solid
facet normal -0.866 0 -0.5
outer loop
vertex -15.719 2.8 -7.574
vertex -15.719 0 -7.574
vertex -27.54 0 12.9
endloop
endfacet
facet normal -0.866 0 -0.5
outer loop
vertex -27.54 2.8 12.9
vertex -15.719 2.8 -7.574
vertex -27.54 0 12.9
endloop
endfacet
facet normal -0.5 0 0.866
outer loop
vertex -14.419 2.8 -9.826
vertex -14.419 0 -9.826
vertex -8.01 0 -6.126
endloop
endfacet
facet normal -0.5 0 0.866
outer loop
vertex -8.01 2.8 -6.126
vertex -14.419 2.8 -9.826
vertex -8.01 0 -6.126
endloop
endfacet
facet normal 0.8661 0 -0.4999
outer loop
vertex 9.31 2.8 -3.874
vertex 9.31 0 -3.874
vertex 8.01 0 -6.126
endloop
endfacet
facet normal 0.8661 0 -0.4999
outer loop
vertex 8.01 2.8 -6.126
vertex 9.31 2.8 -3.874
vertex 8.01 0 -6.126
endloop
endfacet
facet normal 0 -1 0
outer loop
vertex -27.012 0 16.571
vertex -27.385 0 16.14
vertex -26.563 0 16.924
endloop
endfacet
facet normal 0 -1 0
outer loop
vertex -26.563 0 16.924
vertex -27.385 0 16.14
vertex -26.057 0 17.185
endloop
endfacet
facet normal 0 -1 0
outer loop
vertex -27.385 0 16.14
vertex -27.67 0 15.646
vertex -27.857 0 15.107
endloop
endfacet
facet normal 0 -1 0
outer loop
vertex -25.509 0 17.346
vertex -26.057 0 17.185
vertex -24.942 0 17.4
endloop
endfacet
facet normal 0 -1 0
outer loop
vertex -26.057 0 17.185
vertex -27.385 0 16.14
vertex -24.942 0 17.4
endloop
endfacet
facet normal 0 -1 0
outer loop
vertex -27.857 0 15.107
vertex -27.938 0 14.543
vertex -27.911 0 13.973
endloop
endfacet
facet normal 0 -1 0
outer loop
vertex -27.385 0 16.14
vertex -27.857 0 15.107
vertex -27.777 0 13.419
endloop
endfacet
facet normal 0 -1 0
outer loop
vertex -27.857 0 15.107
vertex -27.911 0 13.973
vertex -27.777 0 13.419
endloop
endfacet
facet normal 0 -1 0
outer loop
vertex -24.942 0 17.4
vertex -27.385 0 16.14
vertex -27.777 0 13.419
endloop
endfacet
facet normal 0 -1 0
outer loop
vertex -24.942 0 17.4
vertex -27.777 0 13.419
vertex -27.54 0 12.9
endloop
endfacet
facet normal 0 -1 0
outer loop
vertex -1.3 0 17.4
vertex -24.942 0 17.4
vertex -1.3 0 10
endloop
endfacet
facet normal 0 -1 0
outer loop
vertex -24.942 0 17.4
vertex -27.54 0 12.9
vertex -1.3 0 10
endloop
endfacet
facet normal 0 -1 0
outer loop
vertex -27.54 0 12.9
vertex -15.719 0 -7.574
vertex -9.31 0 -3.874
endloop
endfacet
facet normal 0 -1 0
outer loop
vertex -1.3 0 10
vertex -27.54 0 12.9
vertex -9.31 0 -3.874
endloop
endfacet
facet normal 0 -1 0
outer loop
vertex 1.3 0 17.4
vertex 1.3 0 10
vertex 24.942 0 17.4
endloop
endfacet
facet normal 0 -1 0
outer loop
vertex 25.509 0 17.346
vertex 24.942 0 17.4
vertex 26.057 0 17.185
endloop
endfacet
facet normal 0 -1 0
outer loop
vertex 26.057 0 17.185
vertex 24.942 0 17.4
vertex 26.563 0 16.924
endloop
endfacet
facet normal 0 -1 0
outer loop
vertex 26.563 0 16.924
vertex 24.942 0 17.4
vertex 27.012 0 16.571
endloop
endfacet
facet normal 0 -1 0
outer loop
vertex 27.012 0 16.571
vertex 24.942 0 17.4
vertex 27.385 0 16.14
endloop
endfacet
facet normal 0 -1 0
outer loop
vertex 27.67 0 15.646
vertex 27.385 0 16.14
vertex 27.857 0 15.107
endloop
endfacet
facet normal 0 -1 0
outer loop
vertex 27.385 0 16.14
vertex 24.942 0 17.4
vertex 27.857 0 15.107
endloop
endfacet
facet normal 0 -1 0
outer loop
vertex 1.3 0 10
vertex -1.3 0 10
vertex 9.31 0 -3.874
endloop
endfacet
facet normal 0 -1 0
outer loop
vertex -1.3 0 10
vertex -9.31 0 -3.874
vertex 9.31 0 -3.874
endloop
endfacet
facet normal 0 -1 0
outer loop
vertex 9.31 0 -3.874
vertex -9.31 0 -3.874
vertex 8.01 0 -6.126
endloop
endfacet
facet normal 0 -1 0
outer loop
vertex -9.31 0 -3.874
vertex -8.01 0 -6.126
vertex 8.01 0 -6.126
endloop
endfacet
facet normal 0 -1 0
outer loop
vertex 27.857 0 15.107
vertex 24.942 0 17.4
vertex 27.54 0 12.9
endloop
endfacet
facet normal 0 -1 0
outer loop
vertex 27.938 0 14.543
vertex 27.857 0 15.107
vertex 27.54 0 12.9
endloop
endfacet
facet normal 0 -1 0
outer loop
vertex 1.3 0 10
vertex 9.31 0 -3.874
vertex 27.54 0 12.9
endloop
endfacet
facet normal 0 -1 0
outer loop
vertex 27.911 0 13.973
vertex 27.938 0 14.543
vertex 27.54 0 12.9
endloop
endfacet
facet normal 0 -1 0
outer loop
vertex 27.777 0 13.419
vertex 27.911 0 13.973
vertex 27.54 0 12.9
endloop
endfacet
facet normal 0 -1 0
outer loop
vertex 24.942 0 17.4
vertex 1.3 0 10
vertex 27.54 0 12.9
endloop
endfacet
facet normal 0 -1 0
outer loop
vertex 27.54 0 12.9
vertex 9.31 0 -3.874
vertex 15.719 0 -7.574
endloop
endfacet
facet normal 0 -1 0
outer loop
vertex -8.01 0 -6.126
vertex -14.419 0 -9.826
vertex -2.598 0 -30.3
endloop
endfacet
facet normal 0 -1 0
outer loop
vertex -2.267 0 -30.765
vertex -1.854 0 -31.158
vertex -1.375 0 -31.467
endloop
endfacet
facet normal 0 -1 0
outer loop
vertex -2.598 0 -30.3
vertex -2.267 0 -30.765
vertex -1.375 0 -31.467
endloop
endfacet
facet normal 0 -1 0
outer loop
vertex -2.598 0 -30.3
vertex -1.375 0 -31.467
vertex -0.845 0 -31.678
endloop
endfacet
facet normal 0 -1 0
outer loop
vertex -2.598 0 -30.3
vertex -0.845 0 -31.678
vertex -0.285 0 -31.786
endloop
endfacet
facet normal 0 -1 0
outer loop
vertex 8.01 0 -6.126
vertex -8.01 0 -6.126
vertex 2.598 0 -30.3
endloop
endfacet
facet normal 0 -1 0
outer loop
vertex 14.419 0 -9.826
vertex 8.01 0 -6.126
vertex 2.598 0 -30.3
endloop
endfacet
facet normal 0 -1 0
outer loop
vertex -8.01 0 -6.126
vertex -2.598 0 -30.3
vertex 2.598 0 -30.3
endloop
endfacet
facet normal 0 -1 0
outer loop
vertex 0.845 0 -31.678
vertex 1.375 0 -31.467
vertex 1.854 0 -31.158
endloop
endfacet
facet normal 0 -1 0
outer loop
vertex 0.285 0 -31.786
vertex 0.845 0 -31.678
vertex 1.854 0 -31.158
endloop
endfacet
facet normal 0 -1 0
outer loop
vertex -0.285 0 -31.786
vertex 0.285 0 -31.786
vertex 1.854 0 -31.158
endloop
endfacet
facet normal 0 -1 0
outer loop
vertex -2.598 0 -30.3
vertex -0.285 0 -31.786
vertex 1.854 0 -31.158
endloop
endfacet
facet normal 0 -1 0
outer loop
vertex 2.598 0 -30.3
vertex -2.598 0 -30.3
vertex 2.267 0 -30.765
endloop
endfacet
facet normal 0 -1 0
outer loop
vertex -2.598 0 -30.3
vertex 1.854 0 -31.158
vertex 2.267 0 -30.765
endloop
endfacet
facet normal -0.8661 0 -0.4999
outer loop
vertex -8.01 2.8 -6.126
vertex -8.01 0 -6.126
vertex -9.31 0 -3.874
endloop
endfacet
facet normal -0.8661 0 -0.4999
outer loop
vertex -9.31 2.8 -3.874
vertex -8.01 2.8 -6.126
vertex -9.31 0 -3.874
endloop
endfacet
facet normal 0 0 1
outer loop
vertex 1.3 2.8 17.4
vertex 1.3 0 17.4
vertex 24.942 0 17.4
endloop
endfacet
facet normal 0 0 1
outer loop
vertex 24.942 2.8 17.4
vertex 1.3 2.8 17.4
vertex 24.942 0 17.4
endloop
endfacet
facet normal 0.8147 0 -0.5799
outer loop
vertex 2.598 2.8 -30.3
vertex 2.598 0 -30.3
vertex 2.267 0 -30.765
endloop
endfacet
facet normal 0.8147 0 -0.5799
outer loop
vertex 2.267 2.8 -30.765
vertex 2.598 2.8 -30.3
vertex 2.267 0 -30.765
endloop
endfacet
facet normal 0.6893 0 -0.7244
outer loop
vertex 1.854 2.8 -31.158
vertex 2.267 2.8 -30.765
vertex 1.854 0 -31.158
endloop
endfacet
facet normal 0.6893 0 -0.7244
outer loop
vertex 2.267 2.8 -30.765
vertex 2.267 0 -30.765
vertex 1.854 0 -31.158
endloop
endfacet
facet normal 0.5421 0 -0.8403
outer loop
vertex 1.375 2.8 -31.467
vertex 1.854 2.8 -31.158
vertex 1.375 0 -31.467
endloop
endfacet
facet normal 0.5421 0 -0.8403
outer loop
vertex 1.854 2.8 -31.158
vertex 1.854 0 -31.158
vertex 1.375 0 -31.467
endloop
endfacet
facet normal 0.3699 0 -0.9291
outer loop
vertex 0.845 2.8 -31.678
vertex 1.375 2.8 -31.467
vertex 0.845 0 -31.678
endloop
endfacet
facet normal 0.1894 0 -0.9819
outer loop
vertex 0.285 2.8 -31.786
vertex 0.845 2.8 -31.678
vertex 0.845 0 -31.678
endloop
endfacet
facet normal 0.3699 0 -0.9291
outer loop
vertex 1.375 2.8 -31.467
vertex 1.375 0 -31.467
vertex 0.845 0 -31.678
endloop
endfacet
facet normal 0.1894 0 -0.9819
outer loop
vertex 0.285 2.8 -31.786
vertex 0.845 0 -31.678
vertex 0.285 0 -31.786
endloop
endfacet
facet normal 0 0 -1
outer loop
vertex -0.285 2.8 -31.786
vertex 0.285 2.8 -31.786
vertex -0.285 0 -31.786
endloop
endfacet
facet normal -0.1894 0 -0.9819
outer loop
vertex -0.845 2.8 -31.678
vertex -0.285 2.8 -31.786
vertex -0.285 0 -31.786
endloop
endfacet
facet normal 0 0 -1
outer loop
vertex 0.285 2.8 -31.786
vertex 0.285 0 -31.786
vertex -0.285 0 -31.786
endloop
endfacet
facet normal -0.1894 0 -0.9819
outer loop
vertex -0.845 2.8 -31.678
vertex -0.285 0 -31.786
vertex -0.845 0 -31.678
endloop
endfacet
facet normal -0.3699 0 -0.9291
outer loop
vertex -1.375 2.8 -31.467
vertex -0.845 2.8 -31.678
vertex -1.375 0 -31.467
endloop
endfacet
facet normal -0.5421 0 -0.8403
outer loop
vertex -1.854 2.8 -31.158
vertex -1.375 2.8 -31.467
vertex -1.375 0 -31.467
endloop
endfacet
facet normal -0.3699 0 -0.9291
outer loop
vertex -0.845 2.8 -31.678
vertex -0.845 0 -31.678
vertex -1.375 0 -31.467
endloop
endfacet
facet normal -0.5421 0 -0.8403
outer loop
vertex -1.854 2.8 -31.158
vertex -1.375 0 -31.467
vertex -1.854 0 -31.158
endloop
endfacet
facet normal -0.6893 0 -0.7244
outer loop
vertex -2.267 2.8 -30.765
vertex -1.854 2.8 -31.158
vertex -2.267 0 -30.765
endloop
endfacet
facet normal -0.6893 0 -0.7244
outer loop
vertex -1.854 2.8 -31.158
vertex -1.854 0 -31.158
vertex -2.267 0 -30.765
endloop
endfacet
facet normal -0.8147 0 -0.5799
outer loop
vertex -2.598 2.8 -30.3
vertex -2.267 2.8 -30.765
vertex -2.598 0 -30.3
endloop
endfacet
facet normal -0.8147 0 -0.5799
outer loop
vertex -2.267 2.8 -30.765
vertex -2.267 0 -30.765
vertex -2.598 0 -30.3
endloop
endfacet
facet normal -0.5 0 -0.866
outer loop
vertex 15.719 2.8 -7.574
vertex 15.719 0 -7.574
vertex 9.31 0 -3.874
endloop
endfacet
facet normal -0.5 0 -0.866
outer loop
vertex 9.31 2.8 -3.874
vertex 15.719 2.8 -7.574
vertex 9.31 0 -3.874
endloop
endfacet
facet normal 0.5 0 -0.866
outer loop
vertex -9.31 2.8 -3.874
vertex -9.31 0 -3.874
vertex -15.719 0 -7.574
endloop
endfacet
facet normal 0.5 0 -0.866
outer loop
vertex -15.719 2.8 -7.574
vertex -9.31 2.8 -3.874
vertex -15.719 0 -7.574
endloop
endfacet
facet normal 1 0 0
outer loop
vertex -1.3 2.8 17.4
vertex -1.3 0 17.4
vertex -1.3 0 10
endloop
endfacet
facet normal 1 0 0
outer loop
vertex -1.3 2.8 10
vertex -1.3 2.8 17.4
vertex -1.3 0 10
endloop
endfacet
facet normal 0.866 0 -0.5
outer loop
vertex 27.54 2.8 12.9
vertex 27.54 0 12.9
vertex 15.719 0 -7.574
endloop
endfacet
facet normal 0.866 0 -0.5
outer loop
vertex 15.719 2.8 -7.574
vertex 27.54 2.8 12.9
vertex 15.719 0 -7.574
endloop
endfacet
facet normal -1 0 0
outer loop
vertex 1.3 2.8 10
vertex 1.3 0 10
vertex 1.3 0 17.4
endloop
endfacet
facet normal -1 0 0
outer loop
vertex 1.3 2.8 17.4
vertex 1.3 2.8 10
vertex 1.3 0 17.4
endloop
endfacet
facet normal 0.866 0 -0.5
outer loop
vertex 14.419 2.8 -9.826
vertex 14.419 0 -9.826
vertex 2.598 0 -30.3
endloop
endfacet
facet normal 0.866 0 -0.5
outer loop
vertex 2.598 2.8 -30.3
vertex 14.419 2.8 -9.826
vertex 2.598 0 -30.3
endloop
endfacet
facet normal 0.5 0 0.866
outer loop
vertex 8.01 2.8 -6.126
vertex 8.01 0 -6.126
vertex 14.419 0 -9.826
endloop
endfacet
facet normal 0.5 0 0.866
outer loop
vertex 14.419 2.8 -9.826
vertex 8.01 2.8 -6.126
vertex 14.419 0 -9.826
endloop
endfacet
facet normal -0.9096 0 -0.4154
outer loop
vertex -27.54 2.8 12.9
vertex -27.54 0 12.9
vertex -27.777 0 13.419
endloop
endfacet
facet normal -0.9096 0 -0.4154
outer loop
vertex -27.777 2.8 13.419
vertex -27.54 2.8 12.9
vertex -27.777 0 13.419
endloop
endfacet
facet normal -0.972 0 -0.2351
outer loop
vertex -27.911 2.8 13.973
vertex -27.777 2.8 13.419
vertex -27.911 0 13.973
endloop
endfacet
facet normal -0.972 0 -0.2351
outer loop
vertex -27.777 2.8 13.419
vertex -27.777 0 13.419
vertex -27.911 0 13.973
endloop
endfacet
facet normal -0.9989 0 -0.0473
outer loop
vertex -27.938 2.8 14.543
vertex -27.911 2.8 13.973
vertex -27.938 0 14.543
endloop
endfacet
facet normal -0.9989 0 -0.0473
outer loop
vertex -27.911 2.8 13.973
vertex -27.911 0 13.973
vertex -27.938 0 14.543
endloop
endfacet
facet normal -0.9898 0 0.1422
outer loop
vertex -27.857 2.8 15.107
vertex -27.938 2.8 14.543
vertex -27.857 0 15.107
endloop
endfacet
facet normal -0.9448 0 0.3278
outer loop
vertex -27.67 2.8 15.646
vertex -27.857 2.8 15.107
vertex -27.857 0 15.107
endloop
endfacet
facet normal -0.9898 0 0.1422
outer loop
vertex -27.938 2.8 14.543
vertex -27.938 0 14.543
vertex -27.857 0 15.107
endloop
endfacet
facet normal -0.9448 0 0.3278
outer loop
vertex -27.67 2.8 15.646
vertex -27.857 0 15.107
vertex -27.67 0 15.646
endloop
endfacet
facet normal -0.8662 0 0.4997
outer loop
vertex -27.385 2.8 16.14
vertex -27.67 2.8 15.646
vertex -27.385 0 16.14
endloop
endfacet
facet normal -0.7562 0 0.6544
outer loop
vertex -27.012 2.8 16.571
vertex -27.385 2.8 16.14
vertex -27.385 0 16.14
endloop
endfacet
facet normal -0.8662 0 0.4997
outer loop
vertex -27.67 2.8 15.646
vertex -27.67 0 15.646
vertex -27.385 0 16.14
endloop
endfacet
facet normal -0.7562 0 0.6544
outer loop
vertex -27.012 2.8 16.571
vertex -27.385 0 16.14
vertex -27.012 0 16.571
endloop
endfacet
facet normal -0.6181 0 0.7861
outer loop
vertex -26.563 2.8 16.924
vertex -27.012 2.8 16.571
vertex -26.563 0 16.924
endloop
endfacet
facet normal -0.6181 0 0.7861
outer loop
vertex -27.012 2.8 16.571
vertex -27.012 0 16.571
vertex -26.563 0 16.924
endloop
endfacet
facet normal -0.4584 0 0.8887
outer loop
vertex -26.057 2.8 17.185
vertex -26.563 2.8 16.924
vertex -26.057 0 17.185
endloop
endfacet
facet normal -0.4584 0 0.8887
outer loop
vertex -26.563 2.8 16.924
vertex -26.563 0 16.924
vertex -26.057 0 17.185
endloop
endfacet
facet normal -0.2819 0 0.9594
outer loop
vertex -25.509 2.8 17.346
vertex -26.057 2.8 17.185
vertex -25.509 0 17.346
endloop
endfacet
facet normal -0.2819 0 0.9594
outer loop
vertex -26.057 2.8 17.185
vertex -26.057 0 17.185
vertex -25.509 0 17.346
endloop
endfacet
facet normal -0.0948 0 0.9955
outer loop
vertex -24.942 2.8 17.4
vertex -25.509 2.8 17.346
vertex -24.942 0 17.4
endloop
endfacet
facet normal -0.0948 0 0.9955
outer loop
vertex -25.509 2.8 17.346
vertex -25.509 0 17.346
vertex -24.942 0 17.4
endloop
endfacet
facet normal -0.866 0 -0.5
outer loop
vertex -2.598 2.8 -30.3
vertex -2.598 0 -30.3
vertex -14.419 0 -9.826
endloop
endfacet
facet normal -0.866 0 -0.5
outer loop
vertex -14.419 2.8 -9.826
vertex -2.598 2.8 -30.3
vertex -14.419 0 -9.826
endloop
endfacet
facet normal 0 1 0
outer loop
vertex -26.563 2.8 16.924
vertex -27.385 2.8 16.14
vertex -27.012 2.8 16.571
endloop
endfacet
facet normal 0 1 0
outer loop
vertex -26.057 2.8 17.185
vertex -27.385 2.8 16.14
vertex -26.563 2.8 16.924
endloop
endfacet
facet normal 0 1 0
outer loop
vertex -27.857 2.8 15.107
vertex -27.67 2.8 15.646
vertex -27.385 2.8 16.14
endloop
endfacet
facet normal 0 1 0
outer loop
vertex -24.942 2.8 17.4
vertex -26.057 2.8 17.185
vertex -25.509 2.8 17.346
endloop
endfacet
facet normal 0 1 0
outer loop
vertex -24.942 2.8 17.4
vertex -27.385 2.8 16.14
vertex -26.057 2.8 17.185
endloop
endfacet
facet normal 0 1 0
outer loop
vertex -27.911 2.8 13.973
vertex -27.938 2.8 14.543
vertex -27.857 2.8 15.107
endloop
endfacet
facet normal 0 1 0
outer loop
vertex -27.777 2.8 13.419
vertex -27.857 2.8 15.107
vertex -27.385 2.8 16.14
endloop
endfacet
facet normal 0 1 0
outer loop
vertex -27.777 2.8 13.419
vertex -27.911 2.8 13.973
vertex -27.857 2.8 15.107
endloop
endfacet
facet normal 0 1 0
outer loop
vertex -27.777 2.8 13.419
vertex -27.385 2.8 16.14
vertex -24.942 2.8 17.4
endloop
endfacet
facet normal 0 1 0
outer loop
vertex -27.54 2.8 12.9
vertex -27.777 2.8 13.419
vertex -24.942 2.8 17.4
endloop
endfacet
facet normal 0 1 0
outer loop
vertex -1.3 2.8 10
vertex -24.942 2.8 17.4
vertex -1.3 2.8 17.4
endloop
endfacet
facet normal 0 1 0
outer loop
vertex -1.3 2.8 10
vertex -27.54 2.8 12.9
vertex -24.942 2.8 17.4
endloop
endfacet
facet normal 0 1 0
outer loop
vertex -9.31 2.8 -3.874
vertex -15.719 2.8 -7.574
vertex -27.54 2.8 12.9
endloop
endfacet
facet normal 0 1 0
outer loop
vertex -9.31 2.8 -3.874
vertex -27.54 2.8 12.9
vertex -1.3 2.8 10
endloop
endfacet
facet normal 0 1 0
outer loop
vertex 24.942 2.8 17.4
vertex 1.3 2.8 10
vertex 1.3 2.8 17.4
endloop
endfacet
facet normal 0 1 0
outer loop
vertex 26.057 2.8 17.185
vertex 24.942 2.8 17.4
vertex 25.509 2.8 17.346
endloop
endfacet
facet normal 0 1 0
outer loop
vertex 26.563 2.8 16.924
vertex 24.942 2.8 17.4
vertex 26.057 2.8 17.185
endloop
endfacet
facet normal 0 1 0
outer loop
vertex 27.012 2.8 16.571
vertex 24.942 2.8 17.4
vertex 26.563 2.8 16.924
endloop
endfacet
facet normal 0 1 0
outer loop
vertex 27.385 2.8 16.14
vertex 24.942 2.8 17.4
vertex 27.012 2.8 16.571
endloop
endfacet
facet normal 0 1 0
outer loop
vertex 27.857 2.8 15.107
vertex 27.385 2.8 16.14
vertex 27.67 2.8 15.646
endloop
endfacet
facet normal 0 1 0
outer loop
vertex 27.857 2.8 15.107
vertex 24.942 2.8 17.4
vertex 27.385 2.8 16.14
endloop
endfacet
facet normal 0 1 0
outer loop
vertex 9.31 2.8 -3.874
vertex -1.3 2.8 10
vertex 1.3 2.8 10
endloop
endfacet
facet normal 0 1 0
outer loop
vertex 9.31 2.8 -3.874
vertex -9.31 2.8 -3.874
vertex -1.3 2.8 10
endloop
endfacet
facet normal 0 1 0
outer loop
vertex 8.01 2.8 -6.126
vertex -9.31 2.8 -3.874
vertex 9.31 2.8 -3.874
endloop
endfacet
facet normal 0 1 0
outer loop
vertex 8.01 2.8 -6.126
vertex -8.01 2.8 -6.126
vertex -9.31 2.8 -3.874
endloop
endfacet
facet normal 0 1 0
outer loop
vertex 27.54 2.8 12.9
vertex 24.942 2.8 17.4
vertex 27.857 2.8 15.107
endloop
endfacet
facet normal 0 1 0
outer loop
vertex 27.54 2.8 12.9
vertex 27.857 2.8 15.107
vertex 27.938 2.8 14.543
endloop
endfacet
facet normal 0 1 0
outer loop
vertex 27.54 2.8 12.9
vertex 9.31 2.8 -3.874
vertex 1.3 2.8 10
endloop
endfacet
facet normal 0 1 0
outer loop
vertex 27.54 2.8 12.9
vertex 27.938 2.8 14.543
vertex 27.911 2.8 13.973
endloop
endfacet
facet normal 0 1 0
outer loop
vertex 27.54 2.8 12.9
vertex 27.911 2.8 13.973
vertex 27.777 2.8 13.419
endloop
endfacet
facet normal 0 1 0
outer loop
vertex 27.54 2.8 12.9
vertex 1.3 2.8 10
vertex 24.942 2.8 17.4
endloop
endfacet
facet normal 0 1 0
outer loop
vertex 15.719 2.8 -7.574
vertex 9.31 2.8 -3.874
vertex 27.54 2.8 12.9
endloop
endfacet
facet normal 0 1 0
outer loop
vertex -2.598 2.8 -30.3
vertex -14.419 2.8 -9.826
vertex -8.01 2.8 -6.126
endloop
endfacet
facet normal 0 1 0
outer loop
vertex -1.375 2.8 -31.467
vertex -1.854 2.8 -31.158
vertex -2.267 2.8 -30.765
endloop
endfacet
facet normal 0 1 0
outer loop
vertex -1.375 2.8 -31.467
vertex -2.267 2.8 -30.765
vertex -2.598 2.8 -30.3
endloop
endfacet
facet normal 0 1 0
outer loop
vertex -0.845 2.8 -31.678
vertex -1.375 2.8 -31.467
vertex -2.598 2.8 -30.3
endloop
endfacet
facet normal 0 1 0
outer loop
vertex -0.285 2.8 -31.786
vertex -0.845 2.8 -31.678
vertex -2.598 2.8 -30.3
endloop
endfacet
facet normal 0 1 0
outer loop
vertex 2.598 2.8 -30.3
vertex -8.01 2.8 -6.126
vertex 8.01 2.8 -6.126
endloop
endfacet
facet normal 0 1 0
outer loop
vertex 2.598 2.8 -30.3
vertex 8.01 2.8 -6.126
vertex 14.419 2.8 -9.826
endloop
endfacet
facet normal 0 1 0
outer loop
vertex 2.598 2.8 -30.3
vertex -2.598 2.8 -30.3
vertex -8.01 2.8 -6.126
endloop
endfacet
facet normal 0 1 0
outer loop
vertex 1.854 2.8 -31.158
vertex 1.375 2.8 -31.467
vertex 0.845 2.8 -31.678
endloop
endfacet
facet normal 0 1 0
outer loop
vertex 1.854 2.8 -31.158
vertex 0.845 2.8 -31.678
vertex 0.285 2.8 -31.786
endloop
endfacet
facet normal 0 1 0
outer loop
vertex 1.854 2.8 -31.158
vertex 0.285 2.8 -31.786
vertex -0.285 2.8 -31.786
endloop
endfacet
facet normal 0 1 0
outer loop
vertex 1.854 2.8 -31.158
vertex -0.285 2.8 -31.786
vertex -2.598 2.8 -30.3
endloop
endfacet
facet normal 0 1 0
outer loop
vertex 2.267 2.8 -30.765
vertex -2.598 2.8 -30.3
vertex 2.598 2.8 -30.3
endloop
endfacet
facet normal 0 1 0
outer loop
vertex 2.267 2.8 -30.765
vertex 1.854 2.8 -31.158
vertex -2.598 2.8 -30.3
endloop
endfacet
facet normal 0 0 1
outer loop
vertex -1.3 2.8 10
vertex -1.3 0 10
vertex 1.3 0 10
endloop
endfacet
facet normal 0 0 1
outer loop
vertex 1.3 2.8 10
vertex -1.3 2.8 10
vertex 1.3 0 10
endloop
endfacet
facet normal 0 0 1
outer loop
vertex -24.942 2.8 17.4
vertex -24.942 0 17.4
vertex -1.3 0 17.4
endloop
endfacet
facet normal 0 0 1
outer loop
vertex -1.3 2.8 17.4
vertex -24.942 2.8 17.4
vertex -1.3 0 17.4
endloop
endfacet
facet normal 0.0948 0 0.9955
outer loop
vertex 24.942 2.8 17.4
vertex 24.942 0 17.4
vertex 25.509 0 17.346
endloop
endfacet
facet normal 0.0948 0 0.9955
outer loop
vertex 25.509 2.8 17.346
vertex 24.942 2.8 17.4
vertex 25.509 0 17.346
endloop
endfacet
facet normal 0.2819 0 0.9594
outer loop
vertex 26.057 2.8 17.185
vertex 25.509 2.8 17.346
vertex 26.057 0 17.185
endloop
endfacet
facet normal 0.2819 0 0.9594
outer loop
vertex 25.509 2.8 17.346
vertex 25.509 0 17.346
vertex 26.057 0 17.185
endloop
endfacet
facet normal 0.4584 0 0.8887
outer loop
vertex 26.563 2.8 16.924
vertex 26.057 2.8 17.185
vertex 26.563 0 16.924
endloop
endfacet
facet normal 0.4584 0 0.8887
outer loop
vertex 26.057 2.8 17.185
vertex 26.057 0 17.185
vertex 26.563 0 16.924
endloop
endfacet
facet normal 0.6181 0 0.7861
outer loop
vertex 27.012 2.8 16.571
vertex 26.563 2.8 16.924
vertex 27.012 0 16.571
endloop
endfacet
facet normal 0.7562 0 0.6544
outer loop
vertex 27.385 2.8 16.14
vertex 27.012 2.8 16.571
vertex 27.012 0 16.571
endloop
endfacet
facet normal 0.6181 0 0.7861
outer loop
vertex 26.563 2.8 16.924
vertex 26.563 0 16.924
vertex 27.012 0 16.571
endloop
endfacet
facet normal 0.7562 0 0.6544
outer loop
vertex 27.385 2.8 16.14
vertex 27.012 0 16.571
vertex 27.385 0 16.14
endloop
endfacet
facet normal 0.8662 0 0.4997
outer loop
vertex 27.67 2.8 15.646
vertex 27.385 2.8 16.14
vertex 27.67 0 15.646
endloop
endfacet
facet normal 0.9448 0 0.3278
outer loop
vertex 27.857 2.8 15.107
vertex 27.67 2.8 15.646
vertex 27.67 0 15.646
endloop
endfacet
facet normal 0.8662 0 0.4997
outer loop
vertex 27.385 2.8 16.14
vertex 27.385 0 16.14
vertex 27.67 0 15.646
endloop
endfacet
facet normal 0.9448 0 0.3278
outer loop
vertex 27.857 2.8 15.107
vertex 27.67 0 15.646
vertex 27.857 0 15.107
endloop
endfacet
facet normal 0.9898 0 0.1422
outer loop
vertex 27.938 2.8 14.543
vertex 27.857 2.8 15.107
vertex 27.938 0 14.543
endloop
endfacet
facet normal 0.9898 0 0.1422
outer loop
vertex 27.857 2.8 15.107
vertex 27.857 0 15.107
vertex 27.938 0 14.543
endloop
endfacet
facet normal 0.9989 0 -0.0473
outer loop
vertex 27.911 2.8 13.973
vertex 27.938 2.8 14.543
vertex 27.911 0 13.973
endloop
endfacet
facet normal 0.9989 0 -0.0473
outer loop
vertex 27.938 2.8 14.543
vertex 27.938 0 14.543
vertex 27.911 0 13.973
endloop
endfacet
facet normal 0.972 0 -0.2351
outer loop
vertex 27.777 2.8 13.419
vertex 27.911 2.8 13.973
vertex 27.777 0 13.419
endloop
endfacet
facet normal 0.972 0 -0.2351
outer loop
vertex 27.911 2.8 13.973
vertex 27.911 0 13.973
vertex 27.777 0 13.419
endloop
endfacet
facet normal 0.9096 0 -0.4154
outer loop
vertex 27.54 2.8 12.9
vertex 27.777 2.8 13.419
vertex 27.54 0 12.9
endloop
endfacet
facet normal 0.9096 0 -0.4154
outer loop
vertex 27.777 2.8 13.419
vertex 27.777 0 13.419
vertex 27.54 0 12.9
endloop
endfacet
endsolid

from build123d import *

# Parameters (mm, degrees)
BOSS_EXTRUDE1_DEPTH = 2.8


with BuildPart() as part:
    # Sketch1 → Boss-Extrude1 (new body)
    with BuildSketch(Plane(origin=(0, 0, 0), x_dir=(1, 0, 0), z_dir=(0, 1, 0))):
        with BuildLine():
            Line((1.3, -17.4), (24.941531629, -17.4))
            ThreePointArc((24.941531629, -17.4), (27.53960784, -15.9), (27.53960784, -12.9))
            Line((27.53960784, -12.9), (15.718842026, 7.574166975))
            Line((15.718842026, 7.574166975), (9.310254038, 3.874166975))
            Line((9.310254038, 3.874166975), (8.010254038, 6.125833025))
            Line((8.010254038, 6.125833025), (14.418842026, 9.825833025))
            Line((14.418842026, 9.825833025), (2.598076211, 30.3))
            ThreePointArc((2.598076211, 30.3), (0, 31.8), (-2.598076211, 30.3))
            Line((-2.598076211, 30.3), (-14.418842026, 9.825833025))
            Line((-14.418842026, 9.825833025), (-8.010254038, 6.125833025))
            Line((-8.010254038, 6.125833025), (-9.310254038, 3.874166975))
            Line((-9.310254038, 3.874166975), (-15.718842026, 7.574166975))
            Line((-15.718842026, 7.574166975), (-27.53960784, -12.9))
            ThreePointArc((-27.53960784, -12.9), (-27.53960784, -15.9), (-24.941531629, -17.4))
            Line((-24.941531629, -17.4), (-1.3, -17.4))
            Line((-1.3, -17.4), (-1.3, -10))
            Line((-1.3, -10), (1.3, -10))
            Line((1.3, -10), (1.3, -17.4))
        make_face()
    extrude(amount=BOSS_EXTRUDE1_DEPTH)


solid = part.part
